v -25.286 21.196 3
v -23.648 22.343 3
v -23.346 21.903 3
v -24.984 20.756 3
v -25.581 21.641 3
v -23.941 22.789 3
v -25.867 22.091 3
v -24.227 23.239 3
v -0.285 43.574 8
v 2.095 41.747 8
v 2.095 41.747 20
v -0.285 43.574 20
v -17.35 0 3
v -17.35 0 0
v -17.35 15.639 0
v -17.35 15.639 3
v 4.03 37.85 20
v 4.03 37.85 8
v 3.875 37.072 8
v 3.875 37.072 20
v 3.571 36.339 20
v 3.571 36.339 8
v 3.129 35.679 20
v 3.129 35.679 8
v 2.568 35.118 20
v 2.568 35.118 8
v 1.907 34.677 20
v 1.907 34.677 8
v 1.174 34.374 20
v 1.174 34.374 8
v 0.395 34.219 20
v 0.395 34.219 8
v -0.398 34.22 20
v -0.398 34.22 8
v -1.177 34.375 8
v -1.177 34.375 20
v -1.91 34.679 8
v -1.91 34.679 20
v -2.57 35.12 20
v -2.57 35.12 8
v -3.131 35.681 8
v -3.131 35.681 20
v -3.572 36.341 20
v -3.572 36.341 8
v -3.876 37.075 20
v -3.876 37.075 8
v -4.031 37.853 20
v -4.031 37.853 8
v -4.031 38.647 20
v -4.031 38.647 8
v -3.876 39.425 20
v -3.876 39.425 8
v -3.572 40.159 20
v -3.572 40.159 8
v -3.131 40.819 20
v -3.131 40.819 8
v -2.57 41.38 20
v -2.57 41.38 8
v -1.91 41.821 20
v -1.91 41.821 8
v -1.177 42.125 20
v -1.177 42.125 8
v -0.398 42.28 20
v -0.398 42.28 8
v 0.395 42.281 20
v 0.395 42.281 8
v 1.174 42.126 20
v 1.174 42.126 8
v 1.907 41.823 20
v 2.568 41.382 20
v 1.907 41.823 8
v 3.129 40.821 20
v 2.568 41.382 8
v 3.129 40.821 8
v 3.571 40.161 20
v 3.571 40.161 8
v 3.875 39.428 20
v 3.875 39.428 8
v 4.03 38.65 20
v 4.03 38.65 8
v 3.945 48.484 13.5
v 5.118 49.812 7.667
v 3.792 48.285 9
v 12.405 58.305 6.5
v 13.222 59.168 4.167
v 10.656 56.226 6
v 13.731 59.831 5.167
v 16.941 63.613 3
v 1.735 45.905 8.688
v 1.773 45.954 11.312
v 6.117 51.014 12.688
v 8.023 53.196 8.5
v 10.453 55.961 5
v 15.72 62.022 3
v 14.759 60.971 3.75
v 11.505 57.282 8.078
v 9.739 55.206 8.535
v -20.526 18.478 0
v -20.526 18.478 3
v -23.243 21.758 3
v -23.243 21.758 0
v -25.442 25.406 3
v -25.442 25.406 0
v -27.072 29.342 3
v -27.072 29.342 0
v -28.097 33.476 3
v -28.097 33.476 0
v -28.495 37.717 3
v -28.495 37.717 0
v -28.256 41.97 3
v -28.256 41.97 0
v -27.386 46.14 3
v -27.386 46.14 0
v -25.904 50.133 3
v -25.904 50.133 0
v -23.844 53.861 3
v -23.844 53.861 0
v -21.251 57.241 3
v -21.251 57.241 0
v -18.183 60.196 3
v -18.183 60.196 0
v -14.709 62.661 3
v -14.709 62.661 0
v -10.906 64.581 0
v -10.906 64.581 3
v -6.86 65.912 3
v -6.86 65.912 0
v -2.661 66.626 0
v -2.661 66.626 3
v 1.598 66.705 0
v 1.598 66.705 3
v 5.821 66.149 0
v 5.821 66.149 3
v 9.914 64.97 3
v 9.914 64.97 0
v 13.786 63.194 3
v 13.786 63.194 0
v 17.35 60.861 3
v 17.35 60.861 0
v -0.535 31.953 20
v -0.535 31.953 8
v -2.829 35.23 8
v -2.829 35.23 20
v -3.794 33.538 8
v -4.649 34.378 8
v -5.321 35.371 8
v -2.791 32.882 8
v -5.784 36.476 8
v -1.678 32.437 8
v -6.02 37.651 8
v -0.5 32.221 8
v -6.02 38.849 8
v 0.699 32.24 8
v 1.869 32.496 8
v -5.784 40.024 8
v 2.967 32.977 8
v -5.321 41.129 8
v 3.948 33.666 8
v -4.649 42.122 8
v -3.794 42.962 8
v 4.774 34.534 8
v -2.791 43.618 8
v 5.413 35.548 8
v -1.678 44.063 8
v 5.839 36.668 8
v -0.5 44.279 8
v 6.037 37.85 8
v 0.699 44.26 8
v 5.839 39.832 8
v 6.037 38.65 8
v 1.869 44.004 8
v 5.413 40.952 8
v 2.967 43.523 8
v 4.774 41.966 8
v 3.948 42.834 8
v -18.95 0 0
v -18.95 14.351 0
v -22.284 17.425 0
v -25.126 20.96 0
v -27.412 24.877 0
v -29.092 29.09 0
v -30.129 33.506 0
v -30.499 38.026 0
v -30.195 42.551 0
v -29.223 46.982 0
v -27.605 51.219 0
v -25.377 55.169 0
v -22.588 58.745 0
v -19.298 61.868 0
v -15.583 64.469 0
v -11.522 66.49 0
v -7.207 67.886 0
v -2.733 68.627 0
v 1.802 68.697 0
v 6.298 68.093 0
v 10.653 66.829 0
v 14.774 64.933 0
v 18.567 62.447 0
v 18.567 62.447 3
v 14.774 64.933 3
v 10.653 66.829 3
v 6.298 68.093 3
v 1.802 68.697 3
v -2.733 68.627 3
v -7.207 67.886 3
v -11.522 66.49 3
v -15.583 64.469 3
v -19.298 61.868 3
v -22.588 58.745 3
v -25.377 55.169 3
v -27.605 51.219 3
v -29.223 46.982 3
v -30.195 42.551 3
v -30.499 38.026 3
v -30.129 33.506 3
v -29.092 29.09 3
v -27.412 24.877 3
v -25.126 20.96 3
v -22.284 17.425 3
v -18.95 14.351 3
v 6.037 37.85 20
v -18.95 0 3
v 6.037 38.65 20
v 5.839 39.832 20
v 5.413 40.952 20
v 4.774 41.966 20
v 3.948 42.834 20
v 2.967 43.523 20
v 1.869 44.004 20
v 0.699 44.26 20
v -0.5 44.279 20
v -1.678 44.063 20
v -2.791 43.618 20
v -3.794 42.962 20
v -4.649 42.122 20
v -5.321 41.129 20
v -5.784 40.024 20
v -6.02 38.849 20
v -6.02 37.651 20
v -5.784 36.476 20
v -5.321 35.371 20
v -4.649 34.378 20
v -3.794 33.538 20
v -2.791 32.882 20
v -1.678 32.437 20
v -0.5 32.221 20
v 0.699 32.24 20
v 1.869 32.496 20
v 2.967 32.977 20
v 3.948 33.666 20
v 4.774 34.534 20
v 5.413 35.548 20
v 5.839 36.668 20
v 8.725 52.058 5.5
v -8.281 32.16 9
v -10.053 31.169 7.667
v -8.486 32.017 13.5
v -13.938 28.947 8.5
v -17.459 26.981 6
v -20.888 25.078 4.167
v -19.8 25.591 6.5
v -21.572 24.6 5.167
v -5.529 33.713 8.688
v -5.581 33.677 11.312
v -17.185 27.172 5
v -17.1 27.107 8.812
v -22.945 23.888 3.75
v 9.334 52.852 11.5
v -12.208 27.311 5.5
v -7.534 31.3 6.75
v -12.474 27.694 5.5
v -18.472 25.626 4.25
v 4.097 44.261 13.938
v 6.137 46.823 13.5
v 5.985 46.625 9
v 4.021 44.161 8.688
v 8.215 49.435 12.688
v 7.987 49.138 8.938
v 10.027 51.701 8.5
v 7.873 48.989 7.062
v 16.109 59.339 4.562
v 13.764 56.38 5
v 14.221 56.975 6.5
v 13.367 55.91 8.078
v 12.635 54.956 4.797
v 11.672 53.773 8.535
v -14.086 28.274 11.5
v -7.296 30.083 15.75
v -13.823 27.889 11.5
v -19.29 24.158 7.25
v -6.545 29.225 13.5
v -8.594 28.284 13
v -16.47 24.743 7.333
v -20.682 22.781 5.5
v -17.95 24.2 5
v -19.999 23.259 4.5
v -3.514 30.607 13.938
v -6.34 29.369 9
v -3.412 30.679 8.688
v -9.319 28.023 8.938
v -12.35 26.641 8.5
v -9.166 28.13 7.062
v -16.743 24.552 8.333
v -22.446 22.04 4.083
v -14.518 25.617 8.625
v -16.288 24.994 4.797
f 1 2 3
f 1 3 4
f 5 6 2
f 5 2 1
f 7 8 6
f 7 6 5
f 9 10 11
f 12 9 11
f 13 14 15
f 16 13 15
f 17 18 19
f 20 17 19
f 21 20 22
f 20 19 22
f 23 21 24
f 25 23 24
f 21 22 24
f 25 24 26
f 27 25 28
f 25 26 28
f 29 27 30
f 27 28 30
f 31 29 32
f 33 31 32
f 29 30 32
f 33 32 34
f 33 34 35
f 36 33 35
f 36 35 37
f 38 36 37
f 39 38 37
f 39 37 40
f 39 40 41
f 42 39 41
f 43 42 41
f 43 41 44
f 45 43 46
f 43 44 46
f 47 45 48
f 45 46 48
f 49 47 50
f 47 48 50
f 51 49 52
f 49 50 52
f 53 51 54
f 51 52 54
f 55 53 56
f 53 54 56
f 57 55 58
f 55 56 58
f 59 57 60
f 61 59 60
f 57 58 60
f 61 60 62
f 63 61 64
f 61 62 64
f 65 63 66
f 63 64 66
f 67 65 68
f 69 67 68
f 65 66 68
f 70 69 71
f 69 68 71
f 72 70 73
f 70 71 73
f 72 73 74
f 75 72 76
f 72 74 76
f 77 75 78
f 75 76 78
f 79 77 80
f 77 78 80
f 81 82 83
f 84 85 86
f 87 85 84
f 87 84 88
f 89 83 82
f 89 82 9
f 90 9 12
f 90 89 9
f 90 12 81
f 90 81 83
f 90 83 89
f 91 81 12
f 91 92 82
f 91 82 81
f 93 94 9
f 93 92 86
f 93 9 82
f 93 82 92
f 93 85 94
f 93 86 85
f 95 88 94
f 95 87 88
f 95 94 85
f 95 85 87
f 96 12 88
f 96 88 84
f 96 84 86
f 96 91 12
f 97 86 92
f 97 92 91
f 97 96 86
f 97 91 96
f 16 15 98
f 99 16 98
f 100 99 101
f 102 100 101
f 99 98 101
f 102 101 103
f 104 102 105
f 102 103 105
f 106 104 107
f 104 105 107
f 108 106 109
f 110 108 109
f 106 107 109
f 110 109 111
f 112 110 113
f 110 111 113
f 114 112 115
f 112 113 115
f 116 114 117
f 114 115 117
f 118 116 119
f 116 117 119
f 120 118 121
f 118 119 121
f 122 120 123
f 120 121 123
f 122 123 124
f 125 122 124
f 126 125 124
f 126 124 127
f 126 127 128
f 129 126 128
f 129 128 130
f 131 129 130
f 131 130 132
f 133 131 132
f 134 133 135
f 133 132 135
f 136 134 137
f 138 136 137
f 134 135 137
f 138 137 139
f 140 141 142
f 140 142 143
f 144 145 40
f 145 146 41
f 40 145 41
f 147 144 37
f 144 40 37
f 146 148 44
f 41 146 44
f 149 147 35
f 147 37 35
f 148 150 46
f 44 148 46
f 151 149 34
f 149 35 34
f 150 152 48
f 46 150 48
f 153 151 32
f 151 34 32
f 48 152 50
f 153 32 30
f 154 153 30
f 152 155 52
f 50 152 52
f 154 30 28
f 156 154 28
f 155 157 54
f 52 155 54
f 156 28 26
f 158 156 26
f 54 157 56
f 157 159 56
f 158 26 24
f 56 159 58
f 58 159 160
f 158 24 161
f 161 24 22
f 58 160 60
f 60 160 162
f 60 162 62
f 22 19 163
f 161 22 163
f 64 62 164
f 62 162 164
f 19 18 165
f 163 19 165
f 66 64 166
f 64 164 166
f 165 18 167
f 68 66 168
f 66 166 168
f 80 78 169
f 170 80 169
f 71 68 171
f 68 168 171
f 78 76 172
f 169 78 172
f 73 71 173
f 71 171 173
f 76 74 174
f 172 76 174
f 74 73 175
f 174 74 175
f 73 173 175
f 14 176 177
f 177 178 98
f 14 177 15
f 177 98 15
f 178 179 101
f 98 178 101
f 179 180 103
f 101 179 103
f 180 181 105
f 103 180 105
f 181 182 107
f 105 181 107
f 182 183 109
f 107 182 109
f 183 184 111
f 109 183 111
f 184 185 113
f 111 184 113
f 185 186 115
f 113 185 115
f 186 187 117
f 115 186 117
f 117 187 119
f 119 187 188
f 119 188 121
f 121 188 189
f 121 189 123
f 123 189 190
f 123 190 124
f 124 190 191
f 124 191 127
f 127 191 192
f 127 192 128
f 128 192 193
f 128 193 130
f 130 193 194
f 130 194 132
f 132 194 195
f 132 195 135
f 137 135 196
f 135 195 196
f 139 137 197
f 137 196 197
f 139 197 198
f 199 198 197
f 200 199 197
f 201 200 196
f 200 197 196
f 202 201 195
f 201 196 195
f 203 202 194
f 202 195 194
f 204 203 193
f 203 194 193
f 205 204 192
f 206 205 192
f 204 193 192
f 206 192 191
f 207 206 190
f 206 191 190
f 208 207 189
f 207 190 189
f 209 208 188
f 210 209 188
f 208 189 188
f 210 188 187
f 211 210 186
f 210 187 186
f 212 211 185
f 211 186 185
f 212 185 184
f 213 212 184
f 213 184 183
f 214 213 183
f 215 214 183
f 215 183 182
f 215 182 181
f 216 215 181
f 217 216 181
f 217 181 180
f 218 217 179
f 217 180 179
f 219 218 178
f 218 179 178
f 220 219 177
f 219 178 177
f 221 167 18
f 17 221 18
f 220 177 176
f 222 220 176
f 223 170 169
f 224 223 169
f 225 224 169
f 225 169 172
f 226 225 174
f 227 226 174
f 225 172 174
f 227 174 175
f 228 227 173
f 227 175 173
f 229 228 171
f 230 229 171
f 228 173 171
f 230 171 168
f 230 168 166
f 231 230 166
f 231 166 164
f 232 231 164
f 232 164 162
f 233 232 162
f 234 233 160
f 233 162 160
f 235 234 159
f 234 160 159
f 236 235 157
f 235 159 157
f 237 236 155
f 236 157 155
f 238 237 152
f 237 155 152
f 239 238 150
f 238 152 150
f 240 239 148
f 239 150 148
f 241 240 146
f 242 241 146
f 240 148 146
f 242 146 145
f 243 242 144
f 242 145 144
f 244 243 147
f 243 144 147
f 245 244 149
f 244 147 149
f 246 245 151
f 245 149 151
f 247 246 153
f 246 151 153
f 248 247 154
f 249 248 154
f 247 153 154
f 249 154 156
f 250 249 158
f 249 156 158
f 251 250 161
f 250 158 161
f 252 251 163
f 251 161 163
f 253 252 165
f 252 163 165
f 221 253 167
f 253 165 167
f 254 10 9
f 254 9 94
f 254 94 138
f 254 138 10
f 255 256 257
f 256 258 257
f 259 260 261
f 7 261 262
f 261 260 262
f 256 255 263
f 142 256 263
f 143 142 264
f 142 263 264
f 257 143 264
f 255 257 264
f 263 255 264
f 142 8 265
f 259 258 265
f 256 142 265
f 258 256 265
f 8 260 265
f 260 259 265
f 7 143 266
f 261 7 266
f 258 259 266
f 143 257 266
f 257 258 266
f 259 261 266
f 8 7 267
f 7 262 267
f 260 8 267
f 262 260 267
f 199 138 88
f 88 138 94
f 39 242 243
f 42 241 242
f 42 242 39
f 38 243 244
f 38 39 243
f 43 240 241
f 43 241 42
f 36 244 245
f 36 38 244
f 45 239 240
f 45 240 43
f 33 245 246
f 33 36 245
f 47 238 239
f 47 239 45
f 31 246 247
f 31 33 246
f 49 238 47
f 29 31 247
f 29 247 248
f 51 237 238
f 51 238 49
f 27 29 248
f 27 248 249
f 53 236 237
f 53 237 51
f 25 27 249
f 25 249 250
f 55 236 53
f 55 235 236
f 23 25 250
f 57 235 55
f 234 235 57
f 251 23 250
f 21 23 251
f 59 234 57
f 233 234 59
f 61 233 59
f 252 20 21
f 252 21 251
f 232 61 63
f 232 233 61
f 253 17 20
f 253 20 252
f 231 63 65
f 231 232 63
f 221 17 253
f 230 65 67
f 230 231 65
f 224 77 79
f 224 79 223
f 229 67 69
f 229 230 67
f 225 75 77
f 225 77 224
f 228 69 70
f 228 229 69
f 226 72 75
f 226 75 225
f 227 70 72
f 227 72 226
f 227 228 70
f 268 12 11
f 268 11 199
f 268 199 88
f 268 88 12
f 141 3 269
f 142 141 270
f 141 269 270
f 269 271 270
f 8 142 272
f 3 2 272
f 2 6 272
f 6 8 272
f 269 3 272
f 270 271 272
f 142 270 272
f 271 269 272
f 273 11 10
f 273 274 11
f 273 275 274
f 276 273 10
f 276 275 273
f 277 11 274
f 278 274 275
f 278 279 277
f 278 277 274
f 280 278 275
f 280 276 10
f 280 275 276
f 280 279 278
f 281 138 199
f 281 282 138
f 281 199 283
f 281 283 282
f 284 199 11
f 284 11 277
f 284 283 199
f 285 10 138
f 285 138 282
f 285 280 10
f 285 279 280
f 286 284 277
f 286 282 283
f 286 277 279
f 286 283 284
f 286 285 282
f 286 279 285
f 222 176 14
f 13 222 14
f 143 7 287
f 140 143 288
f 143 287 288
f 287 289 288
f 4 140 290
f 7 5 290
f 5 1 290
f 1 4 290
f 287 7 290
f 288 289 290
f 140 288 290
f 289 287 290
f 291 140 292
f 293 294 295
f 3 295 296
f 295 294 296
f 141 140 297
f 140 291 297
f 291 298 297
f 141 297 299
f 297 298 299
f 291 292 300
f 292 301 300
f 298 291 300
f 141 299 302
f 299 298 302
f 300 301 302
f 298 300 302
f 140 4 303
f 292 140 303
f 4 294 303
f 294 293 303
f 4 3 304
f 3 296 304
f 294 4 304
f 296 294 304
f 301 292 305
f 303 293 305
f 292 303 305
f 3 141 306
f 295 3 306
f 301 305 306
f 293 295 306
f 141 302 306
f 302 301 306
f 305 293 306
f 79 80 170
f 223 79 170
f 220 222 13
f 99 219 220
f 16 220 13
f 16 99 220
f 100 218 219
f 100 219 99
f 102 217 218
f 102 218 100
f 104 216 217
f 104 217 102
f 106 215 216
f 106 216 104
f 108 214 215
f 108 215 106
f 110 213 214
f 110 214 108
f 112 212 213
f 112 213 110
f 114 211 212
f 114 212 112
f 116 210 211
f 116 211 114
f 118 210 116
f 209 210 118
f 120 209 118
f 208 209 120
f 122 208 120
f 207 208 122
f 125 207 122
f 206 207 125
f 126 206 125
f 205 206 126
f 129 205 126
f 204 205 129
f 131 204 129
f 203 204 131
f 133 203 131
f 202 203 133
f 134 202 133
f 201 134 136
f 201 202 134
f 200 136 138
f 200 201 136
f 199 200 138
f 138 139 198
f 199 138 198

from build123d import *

# Parameters (mm, degrees)
F1_DEPTH = 3
F4_DEPTH = 12
F7_W     = 4
F7_H     = 12
F10_W    = 3
F10_H    = 12


# Not quite as in the source:
# - a feature of the source that left no trace in its solid (it failed there, or was rolled back) is left out
# - the arcs of a loft's sections are written as splines that run evenly, so that the points pair up as in the source's solid


with BuildPart() as f1:
    # F0 (on Top) → F1 (new body)
    with BuildSketch(Plane.XY):
        with BuildLine():
            ThreePointArc((-17.3497007267, 15.6394298017), (-22.6105701983, 55.5997007267), (17.3497007267, 60.8605701983))
            Line((17.3497007267, 60.8605701983), (18.5672235848, 62.4472768789))
            ThreePointArc((18.5672235848, 62.4472768789), (-24.0488636903, 57.0090552855), (-18.9497007267, 14.3510702673))
            ThreePointArc((-18.9497007267, 14.3510702673), (-18.1593804565, 13.7451657537), (-17.3497007267, 13.1653854984))
            Line((-17.3497007267, 13.1653854984), (-17.3497007267, 15.6394298017))
        make_face()
        with BuildLine():
            Line((-17.3497007267, 0), (-17.3497007267, 13.1653854984))
            ThreePointArc((-17.3497007267, 13.1653854984), (-18.1593804565, 13.7451657537), (-18.9497007267, 14.3510702673))
            Line((-18.9497007267, 14.3510702673), (-18.9497007267, 0))
            Line((-18.9497007267, 0), (-17.3497007267, 0))
        make_face()
    extrude(amount=F1_DEPTH)


with BuildPart() as f4:
    # F3 (on offset) → F4 (new body)
    with BuildSketch(Plane.XY.offset(8)):
        with BuildLine():
            ThreePointArc((4.0301985063, 37.85), (-4.05, 38.25), (4.0301985063, 38.65))
            Line((4.0301985063, 38.65), (6.0367623773, 38.65))
            ThreePointArc((6.0367623773, 38.65), (-6.05, 38.25), (6.0367623773, 37.85))
            Line((6.0367623773, 37.85), (4.0301985063, 37.85))
        make_face()
    extrude(amount=F4_DEPTH)


with BuildPart() as f8:
    # F7 (on face) → F8 section 0
    with BuildSketch(Plane(origin=(14.6540555932, 10.2608801917, 0), x_dir=(-0.5735764364, 0.8191520443, 0), z_dir=(0.8191520443, 0.5735764364, 0))):
        with Locations((28.4810658991, 14)):
            Rectangle(F7_W, F7_H)
    # F5 (on face) → F8 section 1
    with BuildSketch(Plane.XY.offset(3)):
        with BuildLine():
            Line((-24.22673654, 23.2394957905), (-25.8674584367, 22.0906499503))
            ThreePointArc((-25.8674584367, 22.0906499503), (-25.4345547517, 21.4174890589), (-24.9841373508, 20.7559186913))
            Line((-24.9841373508, 20.7559186913), (-23.3458332622, 21.903071564))
            ThreePointArc((-23.3458332622, 21.903071564), (-23.7956688669, 22.5650982415), (-24.22673654, 23.2394957905))
        make_face()
    loft()


with BuildPart() as f11:
    # F10 (on face) → F11 section 0
    with BuildSketch(Plane(origin=(20.9388152153, 27.2879952658, 0), x_dir=(-0.7933533403, 0.608761429, 0), z_dir=(0.608761429, 0.7933533403, 0))):
        with Locations((25.2521627247, 14)):
            Rectangle(F10_W, F10_H)
    # F5 (on face) → F11 section 1
    with BuildSketch(Plane.XY.offset(3)):
        with BuildLine():
            add(Edge.make_bspline(
                [(18.5672235848, 62.4472768789), (18.0379415831, 62.853409243), (17.4953295888, 63.2421692839), (16.9405551176, 63.6127205226)],
                knots=[0, 0, 0, 0, 1, 1, 1, 1], degree=3))
            Line((16.9405551176, 63.6127205226), (15.7202212212, 62.0223504256))
            add(Edge.make_bspline(
                [(15.7202212212, 62.0223504256), (16.276757018, 61.6543234662), (16.8203634304, 61.2667449915), (17.3497007267, 60.8605701983)],
                knots=[0, 0, 0, 0, 1, 1, 1, 1], degree=3))
            Line((17.3497007267, 60.8605701983), (18.5672235848, 62.4472768789))
        make_face()
    loft(ruled=True)


solid = Compound([f1.part, f4.part, f8.part, f11.part])
